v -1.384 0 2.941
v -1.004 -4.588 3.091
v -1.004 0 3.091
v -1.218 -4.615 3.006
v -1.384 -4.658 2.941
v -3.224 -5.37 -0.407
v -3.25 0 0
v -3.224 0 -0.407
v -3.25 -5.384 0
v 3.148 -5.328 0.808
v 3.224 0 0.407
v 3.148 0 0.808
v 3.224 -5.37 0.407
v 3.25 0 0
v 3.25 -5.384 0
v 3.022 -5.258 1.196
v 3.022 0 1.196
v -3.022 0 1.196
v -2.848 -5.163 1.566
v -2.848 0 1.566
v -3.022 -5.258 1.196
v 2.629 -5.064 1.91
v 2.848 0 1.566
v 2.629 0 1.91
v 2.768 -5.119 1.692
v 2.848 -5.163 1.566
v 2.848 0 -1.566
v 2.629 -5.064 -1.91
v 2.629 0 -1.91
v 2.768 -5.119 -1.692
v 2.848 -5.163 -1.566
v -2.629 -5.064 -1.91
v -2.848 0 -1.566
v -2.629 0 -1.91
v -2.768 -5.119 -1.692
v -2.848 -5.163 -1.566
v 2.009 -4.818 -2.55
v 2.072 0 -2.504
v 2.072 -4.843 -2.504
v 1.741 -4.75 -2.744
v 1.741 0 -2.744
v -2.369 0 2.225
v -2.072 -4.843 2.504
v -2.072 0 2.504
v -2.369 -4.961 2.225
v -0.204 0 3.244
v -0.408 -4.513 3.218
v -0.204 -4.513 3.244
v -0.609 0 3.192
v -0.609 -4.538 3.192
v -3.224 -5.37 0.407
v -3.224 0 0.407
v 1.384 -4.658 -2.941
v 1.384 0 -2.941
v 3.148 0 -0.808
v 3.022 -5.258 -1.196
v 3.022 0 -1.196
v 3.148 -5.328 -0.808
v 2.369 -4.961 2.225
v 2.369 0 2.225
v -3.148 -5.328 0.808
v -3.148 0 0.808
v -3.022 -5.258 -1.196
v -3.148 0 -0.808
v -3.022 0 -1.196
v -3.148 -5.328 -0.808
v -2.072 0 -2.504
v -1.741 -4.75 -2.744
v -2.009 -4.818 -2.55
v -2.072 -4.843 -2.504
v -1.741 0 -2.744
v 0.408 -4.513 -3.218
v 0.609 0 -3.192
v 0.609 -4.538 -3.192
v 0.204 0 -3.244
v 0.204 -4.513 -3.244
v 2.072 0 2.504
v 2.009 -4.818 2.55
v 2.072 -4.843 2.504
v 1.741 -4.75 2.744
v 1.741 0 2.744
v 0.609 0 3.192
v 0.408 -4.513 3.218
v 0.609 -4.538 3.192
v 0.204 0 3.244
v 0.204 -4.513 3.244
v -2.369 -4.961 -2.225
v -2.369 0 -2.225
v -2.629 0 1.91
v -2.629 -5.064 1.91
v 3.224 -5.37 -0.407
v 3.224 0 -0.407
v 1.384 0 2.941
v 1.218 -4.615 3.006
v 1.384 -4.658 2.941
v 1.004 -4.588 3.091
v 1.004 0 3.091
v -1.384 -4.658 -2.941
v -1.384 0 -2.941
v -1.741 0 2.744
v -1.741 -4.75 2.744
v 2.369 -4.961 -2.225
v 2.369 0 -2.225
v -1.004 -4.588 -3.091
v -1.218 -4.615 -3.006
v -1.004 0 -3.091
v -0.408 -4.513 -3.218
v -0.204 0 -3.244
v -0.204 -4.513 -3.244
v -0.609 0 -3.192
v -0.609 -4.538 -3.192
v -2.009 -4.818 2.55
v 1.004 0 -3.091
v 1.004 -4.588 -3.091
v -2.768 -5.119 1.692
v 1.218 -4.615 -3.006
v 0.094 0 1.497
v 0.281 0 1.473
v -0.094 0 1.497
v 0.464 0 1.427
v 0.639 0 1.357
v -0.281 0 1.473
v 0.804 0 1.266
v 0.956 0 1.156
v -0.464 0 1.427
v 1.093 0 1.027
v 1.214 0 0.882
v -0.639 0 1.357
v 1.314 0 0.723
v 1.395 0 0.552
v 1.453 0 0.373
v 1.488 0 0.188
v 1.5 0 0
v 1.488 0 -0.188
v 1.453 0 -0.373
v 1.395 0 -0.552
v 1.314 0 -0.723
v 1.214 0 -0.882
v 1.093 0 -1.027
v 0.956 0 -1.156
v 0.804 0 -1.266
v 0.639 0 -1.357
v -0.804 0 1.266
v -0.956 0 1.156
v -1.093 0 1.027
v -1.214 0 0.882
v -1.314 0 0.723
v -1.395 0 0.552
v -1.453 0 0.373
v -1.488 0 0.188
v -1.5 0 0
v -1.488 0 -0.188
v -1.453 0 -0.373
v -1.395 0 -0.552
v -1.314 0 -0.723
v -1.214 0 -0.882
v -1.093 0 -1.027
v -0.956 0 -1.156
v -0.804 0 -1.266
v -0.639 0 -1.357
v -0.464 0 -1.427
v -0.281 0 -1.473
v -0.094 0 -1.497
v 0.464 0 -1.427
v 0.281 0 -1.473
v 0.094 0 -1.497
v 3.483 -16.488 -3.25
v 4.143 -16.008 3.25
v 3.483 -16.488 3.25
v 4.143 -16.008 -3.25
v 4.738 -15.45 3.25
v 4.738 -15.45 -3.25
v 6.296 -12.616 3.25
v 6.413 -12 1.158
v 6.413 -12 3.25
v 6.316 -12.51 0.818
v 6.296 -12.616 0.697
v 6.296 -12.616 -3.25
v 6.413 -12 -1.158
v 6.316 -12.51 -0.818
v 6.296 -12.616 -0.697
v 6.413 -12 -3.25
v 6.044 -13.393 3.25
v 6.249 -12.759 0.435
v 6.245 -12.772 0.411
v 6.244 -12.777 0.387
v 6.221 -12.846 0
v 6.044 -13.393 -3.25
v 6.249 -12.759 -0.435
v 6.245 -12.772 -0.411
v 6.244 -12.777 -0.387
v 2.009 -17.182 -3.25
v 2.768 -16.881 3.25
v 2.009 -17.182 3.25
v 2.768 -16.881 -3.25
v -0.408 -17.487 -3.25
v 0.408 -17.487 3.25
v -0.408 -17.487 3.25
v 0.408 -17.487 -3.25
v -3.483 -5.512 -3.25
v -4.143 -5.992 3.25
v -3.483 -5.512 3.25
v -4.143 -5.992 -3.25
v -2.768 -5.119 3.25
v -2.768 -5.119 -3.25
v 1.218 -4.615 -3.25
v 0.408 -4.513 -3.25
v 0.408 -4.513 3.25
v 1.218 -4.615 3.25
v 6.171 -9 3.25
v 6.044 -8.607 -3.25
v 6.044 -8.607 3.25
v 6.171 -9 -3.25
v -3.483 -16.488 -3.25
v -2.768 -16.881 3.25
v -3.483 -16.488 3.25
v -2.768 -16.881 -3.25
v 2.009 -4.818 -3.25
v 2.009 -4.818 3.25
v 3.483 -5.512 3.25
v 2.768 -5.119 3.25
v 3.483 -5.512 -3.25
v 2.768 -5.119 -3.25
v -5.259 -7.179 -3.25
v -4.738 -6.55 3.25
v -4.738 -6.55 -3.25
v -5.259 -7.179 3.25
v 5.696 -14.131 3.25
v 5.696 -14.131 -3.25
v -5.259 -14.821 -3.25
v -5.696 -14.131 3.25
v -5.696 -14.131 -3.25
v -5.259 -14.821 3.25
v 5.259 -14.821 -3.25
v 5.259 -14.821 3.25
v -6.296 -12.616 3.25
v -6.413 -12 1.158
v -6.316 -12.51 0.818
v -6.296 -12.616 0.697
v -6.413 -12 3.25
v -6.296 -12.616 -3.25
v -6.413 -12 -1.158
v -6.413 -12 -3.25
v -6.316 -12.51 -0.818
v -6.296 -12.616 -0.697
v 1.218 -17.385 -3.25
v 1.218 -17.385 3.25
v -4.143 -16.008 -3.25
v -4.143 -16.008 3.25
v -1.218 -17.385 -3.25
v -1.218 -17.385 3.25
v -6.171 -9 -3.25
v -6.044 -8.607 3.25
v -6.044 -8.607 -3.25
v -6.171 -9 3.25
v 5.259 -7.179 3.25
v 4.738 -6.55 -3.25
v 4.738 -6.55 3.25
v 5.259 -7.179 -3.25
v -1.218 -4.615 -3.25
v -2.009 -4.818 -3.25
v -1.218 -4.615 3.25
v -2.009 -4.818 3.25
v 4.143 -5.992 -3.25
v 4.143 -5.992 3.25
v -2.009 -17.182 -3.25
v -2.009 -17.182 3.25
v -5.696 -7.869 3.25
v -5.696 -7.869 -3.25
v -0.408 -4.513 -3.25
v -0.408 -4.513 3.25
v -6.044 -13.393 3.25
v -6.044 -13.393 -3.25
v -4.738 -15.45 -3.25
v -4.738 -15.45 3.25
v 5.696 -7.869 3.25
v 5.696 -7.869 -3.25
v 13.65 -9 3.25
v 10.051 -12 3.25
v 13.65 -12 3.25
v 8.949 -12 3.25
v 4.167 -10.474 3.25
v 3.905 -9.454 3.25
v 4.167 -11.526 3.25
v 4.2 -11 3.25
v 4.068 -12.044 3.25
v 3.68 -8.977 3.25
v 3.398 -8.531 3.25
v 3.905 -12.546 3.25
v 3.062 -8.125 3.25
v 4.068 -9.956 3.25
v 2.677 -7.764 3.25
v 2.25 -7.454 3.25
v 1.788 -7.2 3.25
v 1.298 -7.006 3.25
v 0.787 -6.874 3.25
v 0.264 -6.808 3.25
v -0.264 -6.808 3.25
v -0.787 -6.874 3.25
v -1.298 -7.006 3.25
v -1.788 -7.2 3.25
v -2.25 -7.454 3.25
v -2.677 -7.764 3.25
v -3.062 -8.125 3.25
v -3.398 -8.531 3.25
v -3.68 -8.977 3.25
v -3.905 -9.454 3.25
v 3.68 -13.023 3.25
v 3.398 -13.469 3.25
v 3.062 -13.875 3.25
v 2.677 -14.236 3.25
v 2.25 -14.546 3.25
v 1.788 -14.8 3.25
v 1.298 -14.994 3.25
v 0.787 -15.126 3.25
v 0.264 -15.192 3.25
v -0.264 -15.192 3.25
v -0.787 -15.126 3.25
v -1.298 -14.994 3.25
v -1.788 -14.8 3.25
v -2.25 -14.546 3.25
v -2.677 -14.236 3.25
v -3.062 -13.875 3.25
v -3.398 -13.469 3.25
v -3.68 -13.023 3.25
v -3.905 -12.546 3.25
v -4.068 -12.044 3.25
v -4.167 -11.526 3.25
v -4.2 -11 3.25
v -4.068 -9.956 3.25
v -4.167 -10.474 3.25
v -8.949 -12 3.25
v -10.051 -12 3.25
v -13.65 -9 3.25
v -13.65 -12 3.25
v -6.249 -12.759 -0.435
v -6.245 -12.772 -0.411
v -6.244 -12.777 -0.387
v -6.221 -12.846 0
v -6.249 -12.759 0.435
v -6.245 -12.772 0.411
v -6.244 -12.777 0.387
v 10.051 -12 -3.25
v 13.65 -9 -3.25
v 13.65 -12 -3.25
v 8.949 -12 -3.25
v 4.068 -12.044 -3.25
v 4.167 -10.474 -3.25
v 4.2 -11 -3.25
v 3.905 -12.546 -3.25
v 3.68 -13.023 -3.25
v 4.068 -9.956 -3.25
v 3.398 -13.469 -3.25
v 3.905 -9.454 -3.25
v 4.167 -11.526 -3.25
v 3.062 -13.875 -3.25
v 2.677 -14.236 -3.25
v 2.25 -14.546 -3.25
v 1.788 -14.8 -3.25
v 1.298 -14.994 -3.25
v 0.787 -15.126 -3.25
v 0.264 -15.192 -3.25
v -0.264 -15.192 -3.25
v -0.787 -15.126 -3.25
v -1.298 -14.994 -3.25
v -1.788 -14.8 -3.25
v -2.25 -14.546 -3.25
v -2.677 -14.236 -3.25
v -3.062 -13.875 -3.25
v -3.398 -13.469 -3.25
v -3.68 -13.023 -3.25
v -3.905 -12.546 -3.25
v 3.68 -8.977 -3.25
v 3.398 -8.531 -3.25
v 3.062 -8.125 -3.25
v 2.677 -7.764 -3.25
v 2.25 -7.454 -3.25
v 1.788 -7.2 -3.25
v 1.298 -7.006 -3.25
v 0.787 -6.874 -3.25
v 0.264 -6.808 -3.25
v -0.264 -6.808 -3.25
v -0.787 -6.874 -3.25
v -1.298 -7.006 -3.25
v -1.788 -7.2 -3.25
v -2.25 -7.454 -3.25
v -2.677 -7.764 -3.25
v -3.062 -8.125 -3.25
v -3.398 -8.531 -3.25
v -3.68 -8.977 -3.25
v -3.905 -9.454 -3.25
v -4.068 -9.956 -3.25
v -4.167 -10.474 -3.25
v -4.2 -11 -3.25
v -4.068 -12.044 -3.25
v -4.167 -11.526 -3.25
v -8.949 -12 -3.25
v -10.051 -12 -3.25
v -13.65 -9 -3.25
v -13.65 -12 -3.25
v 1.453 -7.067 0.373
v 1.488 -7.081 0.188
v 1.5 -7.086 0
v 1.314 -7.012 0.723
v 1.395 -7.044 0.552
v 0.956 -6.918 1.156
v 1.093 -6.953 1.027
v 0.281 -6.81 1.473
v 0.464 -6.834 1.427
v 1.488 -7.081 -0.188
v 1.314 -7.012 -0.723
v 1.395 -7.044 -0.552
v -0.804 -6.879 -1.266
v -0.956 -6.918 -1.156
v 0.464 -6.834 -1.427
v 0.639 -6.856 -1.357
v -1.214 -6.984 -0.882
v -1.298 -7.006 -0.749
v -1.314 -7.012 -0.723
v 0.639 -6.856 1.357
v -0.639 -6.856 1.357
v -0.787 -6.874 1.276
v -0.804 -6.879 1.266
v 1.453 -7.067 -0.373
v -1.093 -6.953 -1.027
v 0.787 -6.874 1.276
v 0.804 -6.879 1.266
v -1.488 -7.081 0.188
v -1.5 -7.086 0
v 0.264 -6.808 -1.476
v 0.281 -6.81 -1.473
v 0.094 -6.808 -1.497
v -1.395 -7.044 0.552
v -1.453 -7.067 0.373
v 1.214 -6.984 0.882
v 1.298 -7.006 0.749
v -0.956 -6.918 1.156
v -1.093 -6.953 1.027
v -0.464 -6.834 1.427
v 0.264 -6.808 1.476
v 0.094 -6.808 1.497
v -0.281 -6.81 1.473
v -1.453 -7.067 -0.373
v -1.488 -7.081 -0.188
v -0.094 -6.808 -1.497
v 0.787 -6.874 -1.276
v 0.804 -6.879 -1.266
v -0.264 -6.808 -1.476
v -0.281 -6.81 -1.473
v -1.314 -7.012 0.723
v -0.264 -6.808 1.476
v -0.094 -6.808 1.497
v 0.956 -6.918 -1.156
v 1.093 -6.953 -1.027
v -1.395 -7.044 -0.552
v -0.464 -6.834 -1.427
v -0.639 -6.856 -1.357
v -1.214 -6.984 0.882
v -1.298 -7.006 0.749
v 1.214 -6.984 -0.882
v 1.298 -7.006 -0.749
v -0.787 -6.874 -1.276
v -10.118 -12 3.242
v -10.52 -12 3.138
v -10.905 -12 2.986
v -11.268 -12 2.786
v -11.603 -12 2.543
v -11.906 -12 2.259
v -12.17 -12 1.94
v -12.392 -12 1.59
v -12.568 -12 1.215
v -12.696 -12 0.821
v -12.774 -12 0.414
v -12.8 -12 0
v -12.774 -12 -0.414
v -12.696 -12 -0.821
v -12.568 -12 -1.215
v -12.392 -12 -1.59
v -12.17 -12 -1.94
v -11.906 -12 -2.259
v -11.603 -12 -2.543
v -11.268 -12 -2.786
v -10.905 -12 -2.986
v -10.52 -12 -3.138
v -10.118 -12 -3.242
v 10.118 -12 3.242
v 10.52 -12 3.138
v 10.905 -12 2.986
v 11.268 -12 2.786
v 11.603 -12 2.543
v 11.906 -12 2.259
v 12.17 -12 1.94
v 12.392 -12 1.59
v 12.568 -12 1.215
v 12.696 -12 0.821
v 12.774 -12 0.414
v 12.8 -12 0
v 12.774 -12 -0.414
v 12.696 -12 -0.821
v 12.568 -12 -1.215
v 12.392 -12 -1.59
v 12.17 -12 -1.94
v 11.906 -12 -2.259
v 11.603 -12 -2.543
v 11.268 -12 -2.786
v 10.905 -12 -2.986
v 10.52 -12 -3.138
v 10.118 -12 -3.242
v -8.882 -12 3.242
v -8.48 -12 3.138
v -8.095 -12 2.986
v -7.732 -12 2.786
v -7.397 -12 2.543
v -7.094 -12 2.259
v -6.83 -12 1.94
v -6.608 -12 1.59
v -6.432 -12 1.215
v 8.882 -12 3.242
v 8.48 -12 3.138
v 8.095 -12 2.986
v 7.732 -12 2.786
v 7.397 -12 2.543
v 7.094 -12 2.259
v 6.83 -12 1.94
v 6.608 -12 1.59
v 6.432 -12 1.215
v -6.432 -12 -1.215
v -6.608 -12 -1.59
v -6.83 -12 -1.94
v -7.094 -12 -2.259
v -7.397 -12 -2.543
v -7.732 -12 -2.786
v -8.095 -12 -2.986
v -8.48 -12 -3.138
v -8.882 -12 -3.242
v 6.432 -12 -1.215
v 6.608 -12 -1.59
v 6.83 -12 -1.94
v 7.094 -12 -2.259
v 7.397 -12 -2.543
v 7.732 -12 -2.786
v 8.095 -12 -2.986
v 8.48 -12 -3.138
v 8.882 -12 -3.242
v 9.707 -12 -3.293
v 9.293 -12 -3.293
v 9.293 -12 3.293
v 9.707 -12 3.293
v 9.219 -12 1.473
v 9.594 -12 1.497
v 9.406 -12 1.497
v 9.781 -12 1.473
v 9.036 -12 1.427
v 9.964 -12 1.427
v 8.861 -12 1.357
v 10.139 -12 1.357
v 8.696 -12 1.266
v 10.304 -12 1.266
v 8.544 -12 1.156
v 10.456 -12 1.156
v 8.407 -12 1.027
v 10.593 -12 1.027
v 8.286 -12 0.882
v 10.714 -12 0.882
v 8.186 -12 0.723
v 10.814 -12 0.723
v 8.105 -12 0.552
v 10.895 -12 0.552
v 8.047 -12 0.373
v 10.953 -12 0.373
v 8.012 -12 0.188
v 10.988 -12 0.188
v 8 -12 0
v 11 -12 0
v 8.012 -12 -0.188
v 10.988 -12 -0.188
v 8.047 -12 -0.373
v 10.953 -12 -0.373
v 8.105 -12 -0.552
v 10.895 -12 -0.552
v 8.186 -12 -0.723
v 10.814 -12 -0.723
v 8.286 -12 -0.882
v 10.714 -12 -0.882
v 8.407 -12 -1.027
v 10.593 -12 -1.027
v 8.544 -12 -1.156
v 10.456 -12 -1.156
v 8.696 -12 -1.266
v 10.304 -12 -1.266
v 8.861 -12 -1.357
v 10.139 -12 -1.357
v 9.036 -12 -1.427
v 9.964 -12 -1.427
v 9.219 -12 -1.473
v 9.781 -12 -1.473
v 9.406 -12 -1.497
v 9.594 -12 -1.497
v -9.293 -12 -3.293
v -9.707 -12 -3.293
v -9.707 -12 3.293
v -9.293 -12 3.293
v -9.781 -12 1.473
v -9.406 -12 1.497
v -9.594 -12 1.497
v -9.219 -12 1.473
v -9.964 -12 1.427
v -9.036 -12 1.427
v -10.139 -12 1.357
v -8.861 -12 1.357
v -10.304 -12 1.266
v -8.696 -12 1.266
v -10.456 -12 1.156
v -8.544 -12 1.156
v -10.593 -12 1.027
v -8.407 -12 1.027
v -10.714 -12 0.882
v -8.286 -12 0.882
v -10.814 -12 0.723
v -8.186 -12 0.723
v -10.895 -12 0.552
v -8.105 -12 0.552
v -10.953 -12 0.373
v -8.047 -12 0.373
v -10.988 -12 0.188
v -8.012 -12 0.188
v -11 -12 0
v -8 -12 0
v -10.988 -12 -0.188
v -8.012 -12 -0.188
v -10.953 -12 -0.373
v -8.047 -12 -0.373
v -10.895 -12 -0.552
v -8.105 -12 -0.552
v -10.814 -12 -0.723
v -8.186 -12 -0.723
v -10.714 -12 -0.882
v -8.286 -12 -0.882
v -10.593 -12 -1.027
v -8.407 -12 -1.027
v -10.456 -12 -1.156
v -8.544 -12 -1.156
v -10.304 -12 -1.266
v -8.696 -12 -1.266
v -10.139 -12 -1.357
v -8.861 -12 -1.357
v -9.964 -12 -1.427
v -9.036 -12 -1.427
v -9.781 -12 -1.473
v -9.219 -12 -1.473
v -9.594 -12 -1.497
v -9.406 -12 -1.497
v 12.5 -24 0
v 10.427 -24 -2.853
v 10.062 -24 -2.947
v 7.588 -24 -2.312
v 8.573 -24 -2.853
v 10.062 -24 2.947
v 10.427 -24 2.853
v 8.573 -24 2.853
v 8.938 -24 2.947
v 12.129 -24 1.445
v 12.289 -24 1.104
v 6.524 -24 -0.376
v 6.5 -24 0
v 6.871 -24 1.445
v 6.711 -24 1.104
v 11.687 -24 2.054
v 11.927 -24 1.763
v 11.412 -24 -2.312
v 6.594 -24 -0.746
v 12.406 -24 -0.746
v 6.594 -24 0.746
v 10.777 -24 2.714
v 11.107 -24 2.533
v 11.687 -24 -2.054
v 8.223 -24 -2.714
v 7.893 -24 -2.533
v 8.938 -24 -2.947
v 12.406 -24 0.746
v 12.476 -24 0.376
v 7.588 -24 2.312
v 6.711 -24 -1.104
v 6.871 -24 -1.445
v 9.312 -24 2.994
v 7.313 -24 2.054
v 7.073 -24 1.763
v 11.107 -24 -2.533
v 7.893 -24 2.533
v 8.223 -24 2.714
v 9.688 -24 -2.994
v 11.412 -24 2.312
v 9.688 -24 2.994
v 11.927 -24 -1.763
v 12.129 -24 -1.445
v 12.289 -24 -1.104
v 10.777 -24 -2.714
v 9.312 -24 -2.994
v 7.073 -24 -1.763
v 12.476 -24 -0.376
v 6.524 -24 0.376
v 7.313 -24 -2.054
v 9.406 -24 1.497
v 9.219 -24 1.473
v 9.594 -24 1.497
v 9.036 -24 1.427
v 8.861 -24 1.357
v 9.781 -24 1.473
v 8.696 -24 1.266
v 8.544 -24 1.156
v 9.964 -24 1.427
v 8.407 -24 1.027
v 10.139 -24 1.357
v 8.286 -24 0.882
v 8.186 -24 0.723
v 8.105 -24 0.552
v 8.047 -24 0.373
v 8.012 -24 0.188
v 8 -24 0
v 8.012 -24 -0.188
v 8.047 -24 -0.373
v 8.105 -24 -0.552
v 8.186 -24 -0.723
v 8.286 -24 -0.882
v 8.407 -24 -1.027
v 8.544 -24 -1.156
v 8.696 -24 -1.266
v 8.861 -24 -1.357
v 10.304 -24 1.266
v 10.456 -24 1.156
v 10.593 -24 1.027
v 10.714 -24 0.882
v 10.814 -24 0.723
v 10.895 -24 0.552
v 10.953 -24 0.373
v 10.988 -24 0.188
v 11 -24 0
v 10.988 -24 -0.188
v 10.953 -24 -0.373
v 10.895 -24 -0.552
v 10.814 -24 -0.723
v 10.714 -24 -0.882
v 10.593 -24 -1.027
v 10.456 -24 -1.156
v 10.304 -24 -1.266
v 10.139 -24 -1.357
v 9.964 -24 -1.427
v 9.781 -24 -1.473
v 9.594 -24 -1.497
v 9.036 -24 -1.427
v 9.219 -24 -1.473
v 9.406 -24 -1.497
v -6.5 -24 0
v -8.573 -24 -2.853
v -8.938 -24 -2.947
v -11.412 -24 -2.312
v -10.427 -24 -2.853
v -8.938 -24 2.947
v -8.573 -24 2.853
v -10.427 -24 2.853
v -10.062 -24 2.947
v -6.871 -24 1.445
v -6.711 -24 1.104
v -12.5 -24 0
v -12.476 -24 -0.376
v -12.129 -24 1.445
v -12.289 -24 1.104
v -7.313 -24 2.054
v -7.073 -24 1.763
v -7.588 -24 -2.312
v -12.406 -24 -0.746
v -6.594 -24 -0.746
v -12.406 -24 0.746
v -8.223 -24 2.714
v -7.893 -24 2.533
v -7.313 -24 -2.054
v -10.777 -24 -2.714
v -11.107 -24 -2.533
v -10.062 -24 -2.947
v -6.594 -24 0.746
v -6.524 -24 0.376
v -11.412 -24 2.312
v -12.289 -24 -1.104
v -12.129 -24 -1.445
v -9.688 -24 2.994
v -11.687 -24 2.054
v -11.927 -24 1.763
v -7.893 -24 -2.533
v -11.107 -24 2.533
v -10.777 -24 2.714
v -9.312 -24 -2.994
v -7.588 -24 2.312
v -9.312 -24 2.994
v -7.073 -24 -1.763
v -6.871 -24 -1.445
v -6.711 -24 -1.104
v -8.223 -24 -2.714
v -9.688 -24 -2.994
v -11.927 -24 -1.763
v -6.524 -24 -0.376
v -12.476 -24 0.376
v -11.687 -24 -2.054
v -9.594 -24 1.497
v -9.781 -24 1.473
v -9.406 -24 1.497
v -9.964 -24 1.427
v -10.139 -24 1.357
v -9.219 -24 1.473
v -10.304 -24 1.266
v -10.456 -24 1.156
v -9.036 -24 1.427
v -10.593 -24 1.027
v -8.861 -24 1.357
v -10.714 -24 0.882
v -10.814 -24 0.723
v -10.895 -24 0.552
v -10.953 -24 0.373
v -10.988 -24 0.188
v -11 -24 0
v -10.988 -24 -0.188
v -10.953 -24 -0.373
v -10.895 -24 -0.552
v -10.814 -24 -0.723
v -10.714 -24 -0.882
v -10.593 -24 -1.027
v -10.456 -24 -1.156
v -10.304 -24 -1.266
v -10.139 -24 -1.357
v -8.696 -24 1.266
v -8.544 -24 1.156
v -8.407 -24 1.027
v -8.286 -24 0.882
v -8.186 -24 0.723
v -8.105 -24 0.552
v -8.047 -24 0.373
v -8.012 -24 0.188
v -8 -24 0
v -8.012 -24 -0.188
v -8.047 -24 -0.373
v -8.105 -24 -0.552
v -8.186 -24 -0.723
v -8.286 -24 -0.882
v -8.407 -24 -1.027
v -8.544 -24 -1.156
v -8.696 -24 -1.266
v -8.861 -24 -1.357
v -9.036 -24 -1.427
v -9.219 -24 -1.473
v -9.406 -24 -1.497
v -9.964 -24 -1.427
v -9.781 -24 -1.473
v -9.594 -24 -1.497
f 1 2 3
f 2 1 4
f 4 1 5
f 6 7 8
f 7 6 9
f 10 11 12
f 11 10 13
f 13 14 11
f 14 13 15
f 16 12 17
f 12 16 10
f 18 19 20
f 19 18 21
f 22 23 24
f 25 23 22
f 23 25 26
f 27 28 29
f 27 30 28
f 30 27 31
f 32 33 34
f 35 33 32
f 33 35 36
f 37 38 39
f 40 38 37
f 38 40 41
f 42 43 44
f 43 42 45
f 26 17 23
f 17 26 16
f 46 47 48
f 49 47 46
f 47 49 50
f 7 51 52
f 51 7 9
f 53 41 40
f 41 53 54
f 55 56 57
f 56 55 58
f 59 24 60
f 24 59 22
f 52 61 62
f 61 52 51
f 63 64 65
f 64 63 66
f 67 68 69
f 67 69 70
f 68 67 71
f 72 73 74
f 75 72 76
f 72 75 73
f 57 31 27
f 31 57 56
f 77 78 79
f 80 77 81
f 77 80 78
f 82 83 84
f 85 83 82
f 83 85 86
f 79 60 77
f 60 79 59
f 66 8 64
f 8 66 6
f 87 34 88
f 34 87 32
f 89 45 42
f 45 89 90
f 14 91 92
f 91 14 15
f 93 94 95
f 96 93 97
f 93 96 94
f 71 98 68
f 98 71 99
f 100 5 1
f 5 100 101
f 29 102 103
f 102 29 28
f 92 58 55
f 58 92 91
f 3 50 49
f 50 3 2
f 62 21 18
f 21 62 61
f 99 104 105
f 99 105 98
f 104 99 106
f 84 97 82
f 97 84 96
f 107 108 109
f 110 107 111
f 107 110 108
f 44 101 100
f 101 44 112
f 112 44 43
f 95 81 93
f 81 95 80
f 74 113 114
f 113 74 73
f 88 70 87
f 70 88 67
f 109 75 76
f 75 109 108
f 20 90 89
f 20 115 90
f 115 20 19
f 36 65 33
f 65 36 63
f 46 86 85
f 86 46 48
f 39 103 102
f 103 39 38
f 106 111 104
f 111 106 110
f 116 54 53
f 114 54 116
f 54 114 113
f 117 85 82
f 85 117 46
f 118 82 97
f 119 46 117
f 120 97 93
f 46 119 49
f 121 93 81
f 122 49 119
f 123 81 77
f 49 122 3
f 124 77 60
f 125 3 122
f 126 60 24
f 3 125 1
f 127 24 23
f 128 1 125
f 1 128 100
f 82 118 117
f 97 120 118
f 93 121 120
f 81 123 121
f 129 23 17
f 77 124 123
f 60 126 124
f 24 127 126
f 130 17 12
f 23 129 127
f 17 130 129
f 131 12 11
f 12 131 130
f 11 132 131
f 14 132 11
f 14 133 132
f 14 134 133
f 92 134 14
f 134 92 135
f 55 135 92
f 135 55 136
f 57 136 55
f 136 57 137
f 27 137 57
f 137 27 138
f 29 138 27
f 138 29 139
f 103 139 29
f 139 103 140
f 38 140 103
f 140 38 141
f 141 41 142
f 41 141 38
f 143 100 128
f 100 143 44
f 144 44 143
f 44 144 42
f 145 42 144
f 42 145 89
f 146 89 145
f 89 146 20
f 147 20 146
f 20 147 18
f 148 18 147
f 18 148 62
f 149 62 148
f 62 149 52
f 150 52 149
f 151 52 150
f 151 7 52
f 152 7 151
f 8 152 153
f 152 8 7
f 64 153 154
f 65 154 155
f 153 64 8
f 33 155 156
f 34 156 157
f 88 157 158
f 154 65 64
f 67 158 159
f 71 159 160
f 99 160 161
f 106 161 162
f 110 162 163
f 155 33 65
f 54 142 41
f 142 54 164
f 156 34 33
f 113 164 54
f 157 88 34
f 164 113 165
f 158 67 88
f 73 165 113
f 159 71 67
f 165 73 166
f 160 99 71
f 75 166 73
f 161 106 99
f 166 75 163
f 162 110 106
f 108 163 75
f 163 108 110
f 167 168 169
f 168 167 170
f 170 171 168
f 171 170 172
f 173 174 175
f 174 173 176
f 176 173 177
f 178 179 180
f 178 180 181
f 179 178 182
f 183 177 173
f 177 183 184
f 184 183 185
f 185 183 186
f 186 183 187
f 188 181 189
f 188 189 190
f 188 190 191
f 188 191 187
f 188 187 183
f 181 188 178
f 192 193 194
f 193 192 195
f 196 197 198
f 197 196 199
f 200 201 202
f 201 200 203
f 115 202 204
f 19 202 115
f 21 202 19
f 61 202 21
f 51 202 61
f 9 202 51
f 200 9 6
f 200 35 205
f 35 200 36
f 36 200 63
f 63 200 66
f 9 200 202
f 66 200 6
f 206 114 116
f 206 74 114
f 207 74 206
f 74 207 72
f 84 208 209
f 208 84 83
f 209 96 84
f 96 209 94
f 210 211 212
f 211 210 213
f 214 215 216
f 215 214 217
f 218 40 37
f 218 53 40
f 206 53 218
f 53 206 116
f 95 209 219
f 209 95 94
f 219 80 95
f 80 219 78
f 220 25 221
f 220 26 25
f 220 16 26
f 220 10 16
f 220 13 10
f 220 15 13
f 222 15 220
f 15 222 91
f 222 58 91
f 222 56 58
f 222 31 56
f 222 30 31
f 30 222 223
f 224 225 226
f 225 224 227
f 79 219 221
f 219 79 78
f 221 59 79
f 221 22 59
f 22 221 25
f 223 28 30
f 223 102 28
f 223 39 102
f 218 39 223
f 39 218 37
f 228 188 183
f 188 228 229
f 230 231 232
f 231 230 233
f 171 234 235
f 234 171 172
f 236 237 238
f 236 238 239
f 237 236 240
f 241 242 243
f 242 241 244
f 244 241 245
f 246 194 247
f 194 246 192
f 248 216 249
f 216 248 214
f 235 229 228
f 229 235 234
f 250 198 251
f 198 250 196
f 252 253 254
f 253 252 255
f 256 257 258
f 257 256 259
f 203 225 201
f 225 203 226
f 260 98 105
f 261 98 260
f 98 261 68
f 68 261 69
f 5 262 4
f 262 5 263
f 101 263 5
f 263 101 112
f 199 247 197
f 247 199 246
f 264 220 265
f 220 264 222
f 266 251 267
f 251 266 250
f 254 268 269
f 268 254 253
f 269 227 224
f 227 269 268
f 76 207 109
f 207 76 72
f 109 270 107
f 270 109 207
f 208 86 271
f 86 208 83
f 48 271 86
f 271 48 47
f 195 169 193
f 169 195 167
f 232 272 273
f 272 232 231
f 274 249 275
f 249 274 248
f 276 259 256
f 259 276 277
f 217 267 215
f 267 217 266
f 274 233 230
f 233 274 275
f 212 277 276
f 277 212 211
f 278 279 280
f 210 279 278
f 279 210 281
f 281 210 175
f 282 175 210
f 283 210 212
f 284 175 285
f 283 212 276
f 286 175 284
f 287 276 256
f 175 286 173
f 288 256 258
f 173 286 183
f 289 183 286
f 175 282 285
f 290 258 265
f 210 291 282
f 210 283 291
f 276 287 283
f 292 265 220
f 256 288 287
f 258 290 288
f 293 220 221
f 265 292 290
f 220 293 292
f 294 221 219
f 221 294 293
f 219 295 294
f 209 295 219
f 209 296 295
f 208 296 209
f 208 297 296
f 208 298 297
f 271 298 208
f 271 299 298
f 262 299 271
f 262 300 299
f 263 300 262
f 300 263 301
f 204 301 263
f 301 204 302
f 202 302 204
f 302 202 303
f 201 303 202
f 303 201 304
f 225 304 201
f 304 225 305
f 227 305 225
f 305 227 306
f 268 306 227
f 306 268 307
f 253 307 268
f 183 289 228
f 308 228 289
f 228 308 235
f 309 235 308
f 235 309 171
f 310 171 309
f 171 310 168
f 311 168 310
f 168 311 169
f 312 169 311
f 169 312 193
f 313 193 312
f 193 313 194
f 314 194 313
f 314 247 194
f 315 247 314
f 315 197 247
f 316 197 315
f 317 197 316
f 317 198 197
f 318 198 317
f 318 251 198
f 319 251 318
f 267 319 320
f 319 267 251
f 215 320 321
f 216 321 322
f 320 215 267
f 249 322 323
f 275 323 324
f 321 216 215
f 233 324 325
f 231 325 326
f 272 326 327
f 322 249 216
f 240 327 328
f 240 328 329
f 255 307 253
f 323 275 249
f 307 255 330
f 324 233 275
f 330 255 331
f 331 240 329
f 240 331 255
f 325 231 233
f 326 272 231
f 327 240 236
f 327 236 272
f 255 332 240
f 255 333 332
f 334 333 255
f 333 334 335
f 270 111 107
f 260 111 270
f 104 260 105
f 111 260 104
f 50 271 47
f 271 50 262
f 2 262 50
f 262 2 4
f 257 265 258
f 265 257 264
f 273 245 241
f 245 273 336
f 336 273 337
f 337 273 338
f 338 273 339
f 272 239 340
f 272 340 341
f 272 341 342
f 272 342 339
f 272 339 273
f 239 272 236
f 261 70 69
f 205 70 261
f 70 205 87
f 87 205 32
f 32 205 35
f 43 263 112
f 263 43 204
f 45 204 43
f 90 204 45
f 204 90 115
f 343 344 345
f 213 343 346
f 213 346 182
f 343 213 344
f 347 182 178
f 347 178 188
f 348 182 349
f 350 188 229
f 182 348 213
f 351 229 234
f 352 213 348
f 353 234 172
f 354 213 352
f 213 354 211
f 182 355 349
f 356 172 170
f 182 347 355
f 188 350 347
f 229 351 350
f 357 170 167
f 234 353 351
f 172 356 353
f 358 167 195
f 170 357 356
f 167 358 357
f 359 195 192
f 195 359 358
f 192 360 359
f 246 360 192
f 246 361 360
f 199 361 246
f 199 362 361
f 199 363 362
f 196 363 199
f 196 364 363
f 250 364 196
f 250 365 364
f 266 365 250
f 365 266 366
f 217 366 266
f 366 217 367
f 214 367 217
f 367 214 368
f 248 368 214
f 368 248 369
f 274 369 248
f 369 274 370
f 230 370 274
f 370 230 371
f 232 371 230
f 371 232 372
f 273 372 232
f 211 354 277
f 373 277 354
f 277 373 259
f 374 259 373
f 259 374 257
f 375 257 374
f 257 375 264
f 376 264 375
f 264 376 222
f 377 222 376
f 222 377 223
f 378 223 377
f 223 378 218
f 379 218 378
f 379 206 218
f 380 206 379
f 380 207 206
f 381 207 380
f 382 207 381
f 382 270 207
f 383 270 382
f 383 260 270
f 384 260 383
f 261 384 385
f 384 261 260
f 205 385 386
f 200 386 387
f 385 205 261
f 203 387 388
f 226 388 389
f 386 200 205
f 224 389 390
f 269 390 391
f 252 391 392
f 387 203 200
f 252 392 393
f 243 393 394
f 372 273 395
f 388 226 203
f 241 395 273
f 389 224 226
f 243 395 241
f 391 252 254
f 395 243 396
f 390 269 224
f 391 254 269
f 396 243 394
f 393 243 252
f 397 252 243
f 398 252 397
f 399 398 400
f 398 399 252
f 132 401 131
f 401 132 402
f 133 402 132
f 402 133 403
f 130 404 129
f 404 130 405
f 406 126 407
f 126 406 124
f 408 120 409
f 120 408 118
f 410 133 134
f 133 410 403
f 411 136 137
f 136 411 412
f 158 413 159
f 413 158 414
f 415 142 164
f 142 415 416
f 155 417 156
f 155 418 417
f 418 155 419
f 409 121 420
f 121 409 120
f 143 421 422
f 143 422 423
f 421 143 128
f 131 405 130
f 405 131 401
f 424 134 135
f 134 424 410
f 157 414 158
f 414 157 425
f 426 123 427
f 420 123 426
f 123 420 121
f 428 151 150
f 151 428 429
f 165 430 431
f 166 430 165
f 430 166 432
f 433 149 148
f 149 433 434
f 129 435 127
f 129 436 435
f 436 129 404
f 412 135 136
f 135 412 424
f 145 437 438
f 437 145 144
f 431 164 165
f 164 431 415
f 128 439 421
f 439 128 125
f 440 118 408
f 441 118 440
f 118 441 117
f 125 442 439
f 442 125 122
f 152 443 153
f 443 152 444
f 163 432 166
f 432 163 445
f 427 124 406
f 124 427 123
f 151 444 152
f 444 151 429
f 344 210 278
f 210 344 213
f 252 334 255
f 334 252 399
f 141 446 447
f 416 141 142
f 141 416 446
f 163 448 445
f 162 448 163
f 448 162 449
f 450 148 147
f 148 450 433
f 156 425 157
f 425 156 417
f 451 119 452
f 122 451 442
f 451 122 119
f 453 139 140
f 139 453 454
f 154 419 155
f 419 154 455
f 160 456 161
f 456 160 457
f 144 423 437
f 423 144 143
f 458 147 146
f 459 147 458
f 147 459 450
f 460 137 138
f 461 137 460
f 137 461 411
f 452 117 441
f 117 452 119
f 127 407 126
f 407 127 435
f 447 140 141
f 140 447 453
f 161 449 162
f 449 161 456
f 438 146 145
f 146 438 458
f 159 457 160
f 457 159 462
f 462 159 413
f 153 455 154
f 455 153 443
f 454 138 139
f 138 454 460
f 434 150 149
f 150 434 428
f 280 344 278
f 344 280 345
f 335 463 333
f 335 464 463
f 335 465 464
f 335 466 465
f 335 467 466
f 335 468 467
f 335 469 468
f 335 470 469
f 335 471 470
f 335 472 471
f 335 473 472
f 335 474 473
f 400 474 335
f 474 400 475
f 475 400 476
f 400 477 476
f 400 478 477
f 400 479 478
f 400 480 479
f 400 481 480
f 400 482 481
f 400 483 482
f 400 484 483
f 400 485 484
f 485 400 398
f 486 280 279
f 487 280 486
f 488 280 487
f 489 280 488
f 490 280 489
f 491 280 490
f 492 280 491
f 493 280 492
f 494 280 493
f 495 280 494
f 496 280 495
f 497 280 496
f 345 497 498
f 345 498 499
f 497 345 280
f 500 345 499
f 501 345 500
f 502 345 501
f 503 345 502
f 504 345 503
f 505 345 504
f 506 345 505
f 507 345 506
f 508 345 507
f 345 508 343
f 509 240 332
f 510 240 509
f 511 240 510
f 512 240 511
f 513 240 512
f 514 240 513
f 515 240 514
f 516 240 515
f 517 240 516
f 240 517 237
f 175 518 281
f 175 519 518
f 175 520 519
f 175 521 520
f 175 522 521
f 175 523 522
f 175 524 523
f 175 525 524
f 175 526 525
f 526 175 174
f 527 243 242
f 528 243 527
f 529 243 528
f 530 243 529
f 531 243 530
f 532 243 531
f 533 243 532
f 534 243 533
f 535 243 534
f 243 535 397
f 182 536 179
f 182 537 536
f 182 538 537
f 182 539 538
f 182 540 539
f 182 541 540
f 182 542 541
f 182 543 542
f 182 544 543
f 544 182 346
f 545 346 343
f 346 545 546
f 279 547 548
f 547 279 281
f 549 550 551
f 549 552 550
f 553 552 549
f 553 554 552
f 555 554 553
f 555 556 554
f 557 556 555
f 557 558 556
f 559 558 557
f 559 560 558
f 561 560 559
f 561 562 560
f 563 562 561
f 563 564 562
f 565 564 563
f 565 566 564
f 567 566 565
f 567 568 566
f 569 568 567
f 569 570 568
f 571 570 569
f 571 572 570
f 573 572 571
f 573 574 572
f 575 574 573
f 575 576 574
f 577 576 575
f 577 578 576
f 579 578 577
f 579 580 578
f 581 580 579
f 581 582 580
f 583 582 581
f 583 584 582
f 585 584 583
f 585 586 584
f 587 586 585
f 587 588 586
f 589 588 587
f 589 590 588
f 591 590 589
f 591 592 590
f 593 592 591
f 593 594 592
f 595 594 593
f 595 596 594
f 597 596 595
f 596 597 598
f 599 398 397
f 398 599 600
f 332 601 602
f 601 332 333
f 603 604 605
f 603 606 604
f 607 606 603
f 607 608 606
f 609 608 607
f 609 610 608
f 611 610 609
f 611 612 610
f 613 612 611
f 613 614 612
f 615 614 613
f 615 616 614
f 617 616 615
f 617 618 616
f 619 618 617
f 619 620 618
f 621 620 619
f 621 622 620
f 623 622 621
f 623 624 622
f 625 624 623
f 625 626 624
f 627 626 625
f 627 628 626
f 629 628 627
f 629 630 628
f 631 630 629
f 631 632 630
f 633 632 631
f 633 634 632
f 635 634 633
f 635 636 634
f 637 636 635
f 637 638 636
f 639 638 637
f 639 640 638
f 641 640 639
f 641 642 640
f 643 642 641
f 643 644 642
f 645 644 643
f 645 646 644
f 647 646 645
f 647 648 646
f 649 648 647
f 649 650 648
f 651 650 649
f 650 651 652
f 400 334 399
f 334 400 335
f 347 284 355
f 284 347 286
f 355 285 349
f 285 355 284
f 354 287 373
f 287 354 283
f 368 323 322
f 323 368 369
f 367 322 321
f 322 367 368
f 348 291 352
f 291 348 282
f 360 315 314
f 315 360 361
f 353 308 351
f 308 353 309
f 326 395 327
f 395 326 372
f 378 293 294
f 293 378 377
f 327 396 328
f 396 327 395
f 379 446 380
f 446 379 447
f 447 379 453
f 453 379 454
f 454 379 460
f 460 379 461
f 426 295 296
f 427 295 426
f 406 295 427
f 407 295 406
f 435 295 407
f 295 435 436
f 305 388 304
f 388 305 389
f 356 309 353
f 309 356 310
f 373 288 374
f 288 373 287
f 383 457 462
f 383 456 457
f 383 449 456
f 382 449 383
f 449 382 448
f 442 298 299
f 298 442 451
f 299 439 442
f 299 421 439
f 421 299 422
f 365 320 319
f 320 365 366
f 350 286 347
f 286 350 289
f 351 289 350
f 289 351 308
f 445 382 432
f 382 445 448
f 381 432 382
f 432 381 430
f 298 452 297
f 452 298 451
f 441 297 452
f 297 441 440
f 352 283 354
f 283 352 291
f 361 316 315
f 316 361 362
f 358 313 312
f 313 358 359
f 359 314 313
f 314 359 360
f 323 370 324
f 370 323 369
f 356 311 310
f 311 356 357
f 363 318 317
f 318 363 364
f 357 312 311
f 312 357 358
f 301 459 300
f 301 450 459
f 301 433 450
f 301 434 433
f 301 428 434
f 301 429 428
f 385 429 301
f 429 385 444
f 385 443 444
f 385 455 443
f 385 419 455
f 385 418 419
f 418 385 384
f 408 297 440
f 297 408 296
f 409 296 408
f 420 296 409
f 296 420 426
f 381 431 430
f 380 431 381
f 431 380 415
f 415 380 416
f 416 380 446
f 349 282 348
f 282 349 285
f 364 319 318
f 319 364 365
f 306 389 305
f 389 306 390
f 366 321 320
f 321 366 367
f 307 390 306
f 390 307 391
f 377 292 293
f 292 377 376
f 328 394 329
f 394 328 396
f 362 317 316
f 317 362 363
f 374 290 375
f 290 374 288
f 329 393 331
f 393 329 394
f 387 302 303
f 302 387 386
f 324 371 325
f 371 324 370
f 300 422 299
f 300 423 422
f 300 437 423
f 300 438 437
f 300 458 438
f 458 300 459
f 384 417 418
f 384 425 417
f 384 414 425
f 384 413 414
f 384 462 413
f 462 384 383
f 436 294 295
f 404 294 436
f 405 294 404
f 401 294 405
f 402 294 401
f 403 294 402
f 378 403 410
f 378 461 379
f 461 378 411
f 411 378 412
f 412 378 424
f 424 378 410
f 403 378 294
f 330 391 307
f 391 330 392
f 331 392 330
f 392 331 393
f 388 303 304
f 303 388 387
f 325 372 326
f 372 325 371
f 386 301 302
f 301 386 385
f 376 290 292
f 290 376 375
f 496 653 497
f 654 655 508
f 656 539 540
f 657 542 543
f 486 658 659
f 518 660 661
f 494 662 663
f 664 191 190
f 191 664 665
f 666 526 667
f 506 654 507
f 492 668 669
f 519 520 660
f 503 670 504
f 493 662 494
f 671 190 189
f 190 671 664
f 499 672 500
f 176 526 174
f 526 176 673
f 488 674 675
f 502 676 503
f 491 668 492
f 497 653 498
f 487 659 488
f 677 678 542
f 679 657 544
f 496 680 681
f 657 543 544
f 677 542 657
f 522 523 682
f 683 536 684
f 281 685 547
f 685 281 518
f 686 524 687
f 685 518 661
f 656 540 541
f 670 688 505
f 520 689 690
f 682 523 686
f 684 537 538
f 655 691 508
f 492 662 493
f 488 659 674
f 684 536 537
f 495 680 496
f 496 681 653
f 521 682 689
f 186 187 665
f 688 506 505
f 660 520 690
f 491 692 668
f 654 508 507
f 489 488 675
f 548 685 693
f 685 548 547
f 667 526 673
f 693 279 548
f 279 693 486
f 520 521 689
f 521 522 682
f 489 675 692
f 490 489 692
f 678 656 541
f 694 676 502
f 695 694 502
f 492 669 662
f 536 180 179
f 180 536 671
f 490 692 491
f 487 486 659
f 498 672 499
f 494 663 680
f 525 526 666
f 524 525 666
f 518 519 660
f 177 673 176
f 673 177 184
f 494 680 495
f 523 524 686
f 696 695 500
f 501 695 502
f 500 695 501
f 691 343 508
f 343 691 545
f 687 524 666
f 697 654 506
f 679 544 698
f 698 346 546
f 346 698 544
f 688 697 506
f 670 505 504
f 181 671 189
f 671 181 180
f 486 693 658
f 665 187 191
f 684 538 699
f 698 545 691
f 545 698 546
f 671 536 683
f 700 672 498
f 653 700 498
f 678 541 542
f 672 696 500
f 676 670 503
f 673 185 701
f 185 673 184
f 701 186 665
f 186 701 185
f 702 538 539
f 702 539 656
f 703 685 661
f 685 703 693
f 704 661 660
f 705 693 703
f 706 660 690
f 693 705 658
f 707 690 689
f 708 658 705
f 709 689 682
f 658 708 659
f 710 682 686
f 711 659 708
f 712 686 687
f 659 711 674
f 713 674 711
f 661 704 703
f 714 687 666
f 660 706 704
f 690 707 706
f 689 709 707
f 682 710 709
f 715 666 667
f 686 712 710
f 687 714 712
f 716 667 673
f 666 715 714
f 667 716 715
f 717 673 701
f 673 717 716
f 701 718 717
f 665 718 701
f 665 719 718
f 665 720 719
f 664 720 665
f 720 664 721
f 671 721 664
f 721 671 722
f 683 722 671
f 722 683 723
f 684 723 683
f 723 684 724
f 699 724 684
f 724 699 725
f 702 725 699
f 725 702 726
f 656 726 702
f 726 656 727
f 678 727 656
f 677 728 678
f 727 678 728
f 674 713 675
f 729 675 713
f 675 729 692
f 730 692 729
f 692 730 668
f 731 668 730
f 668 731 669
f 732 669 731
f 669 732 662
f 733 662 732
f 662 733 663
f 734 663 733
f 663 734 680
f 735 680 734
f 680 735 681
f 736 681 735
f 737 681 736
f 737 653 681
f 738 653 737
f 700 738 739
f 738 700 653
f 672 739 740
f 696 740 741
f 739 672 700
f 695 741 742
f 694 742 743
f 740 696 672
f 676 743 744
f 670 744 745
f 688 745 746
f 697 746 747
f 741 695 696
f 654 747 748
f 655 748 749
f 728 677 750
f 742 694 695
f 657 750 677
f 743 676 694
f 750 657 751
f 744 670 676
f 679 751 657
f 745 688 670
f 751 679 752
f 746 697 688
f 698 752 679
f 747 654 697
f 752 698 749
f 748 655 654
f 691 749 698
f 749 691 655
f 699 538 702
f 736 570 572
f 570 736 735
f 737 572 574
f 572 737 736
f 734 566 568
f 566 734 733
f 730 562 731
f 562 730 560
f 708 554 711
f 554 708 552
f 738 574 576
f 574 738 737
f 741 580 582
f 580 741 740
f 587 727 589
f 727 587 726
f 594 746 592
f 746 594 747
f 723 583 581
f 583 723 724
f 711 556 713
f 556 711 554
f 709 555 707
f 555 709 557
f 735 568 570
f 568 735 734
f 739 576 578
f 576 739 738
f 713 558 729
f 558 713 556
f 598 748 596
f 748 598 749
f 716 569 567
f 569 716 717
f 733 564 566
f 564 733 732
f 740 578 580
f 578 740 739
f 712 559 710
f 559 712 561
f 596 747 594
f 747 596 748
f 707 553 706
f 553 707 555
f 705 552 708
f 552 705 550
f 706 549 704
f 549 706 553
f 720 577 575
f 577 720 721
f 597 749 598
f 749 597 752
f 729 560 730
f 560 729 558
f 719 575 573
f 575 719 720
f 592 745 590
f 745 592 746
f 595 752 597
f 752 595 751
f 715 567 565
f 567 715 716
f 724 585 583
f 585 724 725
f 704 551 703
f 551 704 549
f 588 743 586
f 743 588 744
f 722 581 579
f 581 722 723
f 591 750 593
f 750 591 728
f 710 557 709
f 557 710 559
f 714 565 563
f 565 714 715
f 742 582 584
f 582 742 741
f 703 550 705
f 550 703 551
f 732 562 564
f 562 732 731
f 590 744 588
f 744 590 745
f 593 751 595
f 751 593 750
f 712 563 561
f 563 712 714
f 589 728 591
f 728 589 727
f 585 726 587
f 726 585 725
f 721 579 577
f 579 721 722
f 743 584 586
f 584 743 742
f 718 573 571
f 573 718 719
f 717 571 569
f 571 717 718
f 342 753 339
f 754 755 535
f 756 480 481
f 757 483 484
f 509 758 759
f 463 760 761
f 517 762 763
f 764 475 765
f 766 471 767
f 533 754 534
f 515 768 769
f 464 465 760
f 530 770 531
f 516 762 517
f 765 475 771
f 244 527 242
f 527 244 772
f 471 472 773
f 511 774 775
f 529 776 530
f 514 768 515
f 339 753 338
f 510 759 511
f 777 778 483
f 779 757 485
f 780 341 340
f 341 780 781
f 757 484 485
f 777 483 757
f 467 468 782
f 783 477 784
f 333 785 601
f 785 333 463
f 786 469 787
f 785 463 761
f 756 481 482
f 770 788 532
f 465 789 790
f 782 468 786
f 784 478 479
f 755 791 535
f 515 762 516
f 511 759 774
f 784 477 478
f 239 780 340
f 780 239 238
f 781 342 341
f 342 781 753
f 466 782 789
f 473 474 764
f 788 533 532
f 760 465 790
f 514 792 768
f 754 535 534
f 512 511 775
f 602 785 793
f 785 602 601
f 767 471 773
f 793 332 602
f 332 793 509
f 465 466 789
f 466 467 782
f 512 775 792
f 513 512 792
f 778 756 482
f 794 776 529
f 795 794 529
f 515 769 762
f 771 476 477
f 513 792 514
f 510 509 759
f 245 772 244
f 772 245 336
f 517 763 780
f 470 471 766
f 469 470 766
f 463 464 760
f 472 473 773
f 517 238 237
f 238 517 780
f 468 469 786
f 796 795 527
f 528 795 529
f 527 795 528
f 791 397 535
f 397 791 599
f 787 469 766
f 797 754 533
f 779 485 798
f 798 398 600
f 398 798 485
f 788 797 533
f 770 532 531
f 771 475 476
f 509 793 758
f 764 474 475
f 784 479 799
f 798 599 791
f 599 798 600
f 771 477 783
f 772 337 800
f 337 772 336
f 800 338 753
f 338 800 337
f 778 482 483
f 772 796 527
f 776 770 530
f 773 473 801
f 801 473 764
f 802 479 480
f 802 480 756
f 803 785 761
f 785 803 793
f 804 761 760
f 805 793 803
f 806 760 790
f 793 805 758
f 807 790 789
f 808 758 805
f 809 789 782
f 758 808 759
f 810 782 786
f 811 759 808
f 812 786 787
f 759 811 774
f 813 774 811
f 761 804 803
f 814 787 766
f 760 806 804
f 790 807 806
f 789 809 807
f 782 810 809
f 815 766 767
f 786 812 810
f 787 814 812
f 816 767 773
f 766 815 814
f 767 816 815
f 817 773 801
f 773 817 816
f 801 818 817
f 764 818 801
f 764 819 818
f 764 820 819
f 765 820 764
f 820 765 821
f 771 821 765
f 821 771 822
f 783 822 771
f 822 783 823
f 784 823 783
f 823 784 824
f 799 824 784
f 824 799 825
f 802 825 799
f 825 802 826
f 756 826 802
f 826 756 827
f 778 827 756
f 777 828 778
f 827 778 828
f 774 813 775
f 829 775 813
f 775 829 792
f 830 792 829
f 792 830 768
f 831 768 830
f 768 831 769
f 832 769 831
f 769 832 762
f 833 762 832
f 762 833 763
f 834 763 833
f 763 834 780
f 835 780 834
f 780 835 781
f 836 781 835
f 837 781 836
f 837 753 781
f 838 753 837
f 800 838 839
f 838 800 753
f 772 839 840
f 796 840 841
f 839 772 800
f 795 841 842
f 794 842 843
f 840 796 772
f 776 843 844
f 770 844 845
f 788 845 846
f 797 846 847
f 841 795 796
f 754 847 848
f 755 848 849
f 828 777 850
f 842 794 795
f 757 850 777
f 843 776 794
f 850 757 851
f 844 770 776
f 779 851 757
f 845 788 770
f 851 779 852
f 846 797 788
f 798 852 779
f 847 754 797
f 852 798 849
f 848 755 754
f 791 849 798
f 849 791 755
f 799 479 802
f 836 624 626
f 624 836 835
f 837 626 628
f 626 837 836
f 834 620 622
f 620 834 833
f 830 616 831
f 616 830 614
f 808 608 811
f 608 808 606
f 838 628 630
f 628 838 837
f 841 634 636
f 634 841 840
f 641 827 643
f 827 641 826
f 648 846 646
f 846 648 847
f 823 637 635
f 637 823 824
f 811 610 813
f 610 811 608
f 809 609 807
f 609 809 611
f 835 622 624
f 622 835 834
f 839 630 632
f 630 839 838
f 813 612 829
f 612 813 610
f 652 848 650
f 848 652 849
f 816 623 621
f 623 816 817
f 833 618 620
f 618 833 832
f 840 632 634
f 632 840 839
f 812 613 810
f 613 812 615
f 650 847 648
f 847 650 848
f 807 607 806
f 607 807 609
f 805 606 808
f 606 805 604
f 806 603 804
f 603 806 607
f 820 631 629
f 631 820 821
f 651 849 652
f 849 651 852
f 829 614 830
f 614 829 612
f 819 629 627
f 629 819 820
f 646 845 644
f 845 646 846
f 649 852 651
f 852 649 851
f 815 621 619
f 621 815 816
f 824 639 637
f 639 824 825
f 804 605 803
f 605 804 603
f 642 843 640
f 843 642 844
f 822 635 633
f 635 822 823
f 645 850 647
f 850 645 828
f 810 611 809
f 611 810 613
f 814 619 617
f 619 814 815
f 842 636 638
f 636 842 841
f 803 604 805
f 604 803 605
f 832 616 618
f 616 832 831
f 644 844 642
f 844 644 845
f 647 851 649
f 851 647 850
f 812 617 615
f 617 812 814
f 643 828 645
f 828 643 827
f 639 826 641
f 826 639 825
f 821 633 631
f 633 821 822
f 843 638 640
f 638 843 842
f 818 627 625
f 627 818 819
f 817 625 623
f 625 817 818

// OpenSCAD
// Variables

screwSpace = 19;



// Constants 
$fn = 50;

//translate([40.7, 0, 17.6]) import("endstop-official.stl", convexity=60);


// Functions/Modules
module mount() {
    difference() {
        cylinder(h=12, r1=3.3, r2=3); 
        translate([0, 0, -1]) {
            cylinder(h=14, r=1.5);
        }        
    }
}
module mainSection(width=6.5) {
    
    // Bott Cylinder
    difference() {
        union() {
            cylinder(h=8, r=width/2);
            // Center Cylinder
            translate([0, width/2, 11]) {
                rotate([90, 0, 0]) {
                    cylinder(h=width, r=6.5);
                }
            }
        }
        translate([0, 0, -1]) cylinder(h=10, r=1.5);
    }
    // Centre plane
    translate([-(width*4.2)/2, -width/2, 9]) {
        cube([width*4.2, width, 3]);
    }
}


// Main Code
rotate([90, 0, 0]) {
    difference() {
        mainSection(width=6.5);
        translate([0, 16, 11]) rotate([90, 0, 0]) cylinder(h=34, r=4.2);
    }
    translate([screwSpace/2, 0, 12]) { 
        mount();
    }
    translate([-(screwSpace/2), 0, 12]) { 
        mount();
    }
}
